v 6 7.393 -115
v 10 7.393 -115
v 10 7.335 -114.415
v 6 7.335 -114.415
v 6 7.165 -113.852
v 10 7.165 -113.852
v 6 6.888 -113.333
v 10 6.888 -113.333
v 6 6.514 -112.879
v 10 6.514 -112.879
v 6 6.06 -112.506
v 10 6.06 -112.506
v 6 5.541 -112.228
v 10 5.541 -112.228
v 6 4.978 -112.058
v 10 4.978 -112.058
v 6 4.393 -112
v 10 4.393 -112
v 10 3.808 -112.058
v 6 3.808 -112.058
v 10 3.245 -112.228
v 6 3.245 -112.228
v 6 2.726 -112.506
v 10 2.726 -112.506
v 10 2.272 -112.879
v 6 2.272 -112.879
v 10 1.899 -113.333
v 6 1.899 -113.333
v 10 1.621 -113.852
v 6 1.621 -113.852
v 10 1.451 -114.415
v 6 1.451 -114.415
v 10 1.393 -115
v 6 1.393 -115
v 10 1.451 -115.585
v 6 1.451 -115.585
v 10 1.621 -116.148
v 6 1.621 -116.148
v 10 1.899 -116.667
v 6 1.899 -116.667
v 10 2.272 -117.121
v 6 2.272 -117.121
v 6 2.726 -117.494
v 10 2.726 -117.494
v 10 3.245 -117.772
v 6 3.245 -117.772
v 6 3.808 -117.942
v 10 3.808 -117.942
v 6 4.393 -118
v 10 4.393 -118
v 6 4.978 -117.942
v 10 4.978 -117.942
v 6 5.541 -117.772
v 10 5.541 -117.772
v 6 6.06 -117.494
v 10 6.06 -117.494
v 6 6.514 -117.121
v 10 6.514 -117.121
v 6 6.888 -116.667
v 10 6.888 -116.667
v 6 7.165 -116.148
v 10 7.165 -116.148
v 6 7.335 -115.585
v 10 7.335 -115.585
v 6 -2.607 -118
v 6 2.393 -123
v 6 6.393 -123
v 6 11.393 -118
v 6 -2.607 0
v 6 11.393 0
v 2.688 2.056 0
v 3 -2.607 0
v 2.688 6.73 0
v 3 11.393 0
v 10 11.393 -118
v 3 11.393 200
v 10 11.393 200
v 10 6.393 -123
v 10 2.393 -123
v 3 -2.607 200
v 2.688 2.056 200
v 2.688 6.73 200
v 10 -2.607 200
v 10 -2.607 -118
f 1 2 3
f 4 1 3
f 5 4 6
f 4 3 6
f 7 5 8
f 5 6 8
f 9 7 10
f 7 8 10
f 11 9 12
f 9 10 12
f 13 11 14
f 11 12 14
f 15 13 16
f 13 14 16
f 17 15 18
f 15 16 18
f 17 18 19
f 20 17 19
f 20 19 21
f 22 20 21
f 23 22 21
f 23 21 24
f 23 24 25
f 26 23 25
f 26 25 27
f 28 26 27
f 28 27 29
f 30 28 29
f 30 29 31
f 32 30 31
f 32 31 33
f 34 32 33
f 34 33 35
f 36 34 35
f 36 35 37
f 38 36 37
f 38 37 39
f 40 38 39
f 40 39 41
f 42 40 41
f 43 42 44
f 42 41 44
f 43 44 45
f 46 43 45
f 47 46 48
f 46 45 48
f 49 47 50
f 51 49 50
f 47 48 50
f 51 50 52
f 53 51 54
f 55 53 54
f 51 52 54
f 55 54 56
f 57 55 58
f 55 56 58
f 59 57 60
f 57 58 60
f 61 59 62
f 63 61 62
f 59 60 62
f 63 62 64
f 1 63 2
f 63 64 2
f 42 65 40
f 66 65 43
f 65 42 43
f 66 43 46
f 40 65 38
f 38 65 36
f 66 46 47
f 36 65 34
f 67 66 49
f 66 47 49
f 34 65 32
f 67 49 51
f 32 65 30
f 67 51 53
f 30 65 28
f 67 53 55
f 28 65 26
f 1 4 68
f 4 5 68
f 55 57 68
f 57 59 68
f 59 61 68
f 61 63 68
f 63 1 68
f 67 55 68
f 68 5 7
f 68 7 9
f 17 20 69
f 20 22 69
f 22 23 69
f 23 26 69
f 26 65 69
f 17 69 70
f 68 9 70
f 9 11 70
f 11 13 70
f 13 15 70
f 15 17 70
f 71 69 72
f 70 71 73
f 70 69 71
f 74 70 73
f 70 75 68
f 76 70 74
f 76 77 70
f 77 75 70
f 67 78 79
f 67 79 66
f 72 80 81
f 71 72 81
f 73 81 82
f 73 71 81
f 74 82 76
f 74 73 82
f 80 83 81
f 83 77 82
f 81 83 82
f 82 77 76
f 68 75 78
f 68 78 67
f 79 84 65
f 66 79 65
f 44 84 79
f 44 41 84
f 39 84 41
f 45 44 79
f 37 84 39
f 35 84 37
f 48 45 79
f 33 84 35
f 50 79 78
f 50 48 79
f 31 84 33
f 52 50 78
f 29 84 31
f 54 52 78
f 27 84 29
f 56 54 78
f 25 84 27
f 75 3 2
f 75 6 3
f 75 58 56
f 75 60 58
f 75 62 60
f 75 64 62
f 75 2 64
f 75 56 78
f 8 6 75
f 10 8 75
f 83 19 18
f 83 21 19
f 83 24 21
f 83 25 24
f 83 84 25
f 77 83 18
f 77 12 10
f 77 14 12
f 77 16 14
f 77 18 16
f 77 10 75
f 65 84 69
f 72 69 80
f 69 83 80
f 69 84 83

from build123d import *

# Parameters (mm, degrees)
BOSS_EXTRU_1_DEPTH      = 200
ESQUISSE2_W             = 4
ESQUISSE2_H             = 14
BOSS_EXTRU_2_DEPTH      = 123
ESQUISSE3_R             = 3
ENL_V_MAT_EXTRU_1_DEPTH = 201.45907004
CHANFREIN1_SIZE         = 5


with BuildPart() as part:
    # Esquisse1 → Boss.-Extru.1 (new body)
    with BuildSketch(Plane.XY):
        with BuildLine():
            Line((3, 11.393126576), (10, 11.393126576))
            Line((10, 11.393126576), (10, -2.606873424))
            Line((10, -2.606873424), (3, -2.606873424))
            ThreePointArc((3, -2.606873424), (2.649120597, 4.393126576), (3, 11.393126576))
        make_face()
    extrude(amount=BOSS_EXTRU_1_DEPTH)

    # Esquisse2 → Boss.-Extru.2 (add)
    with BuildSketch(Plane(origin=(0, 0, 0), x_dir=(-1, 0, 0), z_dir=(0, 0, -1))):
        with Locations((-8, 4.393126576)):
            Rectangle(ESQUISSE2_W, ESQUISSE2_H)
    extrude(amount=BOSS_EXTRU_2_DEPTH)

    # Esquisse3 → Enlèv. mat.-Extru.1 (cut, through all)
    with BuildSketch(Plane(origin=(10, 0, 0), x_dir=(0, 0, -1), z_dir=(1, 0, 0))):
        with Locations(Location((115, 4.393126576, 0), (0, 0, 90))):
            Circle(ESQUISSE3_R)
    extrude(amount=-ENL_V_MAT_EXTRU_1_DEPTH, mode=Mode.SUBTRACT)

    # Chanfrein1
    chanfrein1_edges = [part.edges().sort_by_distance(p)[0] for p in [
        (8, -2.606873424, -123),
        (8, 11.393126576, -123),
    ]]
    chamfer(chanfrein1_edges, length=CHANFREIN1_SIZE)


solid = part.part
